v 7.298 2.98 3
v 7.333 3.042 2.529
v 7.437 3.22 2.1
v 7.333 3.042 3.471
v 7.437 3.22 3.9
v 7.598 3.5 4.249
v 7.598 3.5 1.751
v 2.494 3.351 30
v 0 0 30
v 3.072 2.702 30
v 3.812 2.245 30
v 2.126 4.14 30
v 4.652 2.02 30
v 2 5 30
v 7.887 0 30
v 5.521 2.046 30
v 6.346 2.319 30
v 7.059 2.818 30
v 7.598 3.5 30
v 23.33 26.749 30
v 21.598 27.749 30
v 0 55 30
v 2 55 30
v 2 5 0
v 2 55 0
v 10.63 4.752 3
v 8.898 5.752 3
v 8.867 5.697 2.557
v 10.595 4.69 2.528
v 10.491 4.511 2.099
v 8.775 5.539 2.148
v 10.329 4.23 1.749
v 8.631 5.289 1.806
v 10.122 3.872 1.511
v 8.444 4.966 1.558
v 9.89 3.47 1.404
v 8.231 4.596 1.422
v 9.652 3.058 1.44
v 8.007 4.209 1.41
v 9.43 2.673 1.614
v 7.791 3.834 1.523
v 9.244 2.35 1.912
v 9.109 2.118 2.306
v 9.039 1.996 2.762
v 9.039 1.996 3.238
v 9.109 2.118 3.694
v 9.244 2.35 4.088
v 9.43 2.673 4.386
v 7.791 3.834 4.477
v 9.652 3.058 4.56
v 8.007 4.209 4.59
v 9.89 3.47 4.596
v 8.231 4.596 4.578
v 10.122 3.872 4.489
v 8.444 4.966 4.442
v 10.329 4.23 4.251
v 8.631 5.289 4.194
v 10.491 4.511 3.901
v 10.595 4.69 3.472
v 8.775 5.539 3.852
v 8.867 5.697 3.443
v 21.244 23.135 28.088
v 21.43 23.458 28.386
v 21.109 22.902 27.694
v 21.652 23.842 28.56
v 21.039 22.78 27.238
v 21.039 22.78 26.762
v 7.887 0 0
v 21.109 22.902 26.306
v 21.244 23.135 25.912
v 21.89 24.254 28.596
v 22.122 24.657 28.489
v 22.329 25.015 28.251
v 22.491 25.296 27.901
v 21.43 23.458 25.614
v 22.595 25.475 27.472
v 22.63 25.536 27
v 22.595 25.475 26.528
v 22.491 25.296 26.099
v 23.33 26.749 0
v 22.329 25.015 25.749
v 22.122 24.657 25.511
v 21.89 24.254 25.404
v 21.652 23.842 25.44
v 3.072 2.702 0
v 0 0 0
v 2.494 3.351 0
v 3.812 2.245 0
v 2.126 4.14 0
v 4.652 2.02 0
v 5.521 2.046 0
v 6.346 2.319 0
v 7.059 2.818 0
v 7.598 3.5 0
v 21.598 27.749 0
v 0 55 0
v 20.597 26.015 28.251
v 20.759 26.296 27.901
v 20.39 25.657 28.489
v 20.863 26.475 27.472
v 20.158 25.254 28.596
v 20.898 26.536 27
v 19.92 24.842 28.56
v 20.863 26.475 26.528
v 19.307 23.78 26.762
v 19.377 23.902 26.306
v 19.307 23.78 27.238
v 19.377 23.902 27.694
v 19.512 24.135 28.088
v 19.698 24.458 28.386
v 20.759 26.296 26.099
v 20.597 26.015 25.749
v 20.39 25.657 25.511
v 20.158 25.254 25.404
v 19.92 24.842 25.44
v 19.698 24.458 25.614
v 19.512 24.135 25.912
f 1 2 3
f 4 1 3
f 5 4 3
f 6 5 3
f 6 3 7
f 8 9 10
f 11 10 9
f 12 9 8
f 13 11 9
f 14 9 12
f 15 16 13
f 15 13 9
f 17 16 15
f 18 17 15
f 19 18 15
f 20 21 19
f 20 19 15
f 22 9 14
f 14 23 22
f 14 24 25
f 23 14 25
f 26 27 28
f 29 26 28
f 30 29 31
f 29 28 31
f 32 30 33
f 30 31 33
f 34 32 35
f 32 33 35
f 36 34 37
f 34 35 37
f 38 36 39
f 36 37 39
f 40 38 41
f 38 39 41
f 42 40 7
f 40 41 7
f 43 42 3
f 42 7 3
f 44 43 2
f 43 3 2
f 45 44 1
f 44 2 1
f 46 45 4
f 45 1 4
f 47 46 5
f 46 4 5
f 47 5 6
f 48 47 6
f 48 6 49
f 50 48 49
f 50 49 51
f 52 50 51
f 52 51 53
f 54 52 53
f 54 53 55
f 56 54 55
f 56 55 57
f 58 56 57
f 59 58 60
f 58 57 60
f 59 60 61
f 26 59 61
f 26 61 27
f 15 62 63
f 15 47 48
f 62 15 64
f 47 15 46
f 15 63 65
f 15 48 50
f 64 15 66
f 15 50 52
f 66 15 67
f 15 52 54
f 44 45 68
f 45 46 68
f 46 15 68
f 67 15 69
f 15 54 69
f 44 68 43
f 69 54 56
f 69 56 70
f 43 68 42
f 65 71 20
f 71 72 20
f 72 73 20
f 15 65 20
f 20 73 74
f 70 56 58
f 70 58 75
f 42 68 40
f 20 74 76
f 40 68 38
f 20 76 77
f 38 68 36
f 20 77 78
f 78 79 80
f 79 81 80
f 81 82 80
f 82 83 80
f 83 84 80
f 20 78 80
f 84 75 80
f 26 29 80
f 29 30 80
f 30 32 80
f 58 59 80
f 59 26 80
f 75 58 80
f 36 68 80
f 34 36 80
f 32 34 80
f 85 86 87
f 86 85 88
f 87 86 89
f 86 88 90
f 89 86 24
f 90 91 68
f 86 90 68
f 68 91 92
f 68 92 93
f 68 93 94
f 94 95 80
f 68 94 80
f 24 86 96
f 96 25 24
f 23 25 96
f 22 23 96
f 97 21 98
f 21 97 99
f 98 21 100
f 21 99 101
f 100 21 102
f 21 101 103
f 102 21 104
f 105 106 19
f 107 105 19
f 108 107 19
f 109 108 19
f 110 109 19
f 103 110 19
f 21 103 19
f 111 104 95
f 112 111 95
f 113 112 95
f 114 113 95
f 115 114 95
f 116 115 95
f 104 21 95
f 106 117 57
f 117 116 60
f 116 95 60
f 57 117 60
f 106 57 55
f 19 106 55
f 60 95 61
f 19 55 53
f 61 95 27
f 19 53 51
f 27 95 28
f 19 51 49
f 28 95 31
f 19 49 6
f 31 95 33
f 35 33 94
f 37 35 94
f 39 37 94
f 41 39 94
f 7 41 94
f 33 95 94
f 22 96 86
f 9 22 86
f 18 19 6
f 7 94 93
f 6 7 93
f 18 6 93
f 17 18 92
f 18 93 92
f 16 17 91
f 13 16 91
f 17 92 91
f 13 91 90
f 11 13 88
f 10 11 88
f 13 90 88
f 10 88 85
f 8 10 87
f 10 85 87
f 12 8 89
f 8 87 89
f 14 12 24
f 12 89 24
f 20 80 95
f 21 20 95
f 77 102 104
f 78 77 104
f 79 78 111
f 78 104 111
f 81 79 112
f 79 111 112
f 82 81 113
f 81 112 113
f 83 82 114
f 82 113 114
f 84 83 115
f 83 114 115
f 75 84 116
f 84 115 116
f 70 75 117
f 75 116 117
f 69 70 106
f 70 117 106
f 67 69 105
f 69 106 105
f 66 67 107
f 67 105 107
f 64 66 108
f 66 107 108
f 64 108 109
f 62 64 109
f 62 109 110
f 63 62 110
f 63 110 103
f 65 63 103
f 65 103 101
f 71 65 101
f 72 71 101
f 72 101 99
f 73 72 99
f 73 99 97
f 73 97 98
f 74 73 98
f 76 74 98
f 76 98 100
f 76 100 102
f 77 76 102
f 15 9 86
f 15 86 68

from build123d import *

# Parameters (mm, degrees)
RESSALTO_EXTRUS_O1_DEPTH = 30
ESBO_O2_R                = 1.6
CORTE_EXTRUS_O1_DEPTH    = 30


with BuildPart() as part:
    # Esboço1 → Ressalto-extrusão1 (new body)
    with BuildSketch(Plane.XY):
        with BuildLine():
            Line((0, 55), (0, 0))
            Line((0, 0), (7.886751346, 0))
            Line((7.886751346, 0), (23.330127019, 26.748711306))
            Line((23.330127019, 26.748711306), (21.598076211, 27.748711306))
            Line((21.598076211, 27.748711306), (7.598076211, 3.5))
            ThreePointArc((7.598076211, 3.5), (4.223542865, 2.102222521), (2, 5))
            Line((2, 5), (2, 55))
            Line((2, 55), (0, 55))
        make_face()
    extrude(amount=RESSALTO_EXTRUS_O1_DEPTH)

    # Esboço2 → Corte-extrusão1 (cut)
    with BuildSketch(Plane(origin=(4.183012702, -2.415063509, 0), x_dir=(0.5, 0.866025404, 0), z_dir=(-0.866025404, 0.5, 0))):
        with Locations((31.830127019, -27)):
            Circle(ESBO_O2_R)
        with Locations((7.830127019, -3)):
            Circle(ESBO_O2_R)
    extrude(amount=-CORTE_EXTRUS_O1_DEPTH, mode=Mode.SUBTRACT)


solid = part.part
